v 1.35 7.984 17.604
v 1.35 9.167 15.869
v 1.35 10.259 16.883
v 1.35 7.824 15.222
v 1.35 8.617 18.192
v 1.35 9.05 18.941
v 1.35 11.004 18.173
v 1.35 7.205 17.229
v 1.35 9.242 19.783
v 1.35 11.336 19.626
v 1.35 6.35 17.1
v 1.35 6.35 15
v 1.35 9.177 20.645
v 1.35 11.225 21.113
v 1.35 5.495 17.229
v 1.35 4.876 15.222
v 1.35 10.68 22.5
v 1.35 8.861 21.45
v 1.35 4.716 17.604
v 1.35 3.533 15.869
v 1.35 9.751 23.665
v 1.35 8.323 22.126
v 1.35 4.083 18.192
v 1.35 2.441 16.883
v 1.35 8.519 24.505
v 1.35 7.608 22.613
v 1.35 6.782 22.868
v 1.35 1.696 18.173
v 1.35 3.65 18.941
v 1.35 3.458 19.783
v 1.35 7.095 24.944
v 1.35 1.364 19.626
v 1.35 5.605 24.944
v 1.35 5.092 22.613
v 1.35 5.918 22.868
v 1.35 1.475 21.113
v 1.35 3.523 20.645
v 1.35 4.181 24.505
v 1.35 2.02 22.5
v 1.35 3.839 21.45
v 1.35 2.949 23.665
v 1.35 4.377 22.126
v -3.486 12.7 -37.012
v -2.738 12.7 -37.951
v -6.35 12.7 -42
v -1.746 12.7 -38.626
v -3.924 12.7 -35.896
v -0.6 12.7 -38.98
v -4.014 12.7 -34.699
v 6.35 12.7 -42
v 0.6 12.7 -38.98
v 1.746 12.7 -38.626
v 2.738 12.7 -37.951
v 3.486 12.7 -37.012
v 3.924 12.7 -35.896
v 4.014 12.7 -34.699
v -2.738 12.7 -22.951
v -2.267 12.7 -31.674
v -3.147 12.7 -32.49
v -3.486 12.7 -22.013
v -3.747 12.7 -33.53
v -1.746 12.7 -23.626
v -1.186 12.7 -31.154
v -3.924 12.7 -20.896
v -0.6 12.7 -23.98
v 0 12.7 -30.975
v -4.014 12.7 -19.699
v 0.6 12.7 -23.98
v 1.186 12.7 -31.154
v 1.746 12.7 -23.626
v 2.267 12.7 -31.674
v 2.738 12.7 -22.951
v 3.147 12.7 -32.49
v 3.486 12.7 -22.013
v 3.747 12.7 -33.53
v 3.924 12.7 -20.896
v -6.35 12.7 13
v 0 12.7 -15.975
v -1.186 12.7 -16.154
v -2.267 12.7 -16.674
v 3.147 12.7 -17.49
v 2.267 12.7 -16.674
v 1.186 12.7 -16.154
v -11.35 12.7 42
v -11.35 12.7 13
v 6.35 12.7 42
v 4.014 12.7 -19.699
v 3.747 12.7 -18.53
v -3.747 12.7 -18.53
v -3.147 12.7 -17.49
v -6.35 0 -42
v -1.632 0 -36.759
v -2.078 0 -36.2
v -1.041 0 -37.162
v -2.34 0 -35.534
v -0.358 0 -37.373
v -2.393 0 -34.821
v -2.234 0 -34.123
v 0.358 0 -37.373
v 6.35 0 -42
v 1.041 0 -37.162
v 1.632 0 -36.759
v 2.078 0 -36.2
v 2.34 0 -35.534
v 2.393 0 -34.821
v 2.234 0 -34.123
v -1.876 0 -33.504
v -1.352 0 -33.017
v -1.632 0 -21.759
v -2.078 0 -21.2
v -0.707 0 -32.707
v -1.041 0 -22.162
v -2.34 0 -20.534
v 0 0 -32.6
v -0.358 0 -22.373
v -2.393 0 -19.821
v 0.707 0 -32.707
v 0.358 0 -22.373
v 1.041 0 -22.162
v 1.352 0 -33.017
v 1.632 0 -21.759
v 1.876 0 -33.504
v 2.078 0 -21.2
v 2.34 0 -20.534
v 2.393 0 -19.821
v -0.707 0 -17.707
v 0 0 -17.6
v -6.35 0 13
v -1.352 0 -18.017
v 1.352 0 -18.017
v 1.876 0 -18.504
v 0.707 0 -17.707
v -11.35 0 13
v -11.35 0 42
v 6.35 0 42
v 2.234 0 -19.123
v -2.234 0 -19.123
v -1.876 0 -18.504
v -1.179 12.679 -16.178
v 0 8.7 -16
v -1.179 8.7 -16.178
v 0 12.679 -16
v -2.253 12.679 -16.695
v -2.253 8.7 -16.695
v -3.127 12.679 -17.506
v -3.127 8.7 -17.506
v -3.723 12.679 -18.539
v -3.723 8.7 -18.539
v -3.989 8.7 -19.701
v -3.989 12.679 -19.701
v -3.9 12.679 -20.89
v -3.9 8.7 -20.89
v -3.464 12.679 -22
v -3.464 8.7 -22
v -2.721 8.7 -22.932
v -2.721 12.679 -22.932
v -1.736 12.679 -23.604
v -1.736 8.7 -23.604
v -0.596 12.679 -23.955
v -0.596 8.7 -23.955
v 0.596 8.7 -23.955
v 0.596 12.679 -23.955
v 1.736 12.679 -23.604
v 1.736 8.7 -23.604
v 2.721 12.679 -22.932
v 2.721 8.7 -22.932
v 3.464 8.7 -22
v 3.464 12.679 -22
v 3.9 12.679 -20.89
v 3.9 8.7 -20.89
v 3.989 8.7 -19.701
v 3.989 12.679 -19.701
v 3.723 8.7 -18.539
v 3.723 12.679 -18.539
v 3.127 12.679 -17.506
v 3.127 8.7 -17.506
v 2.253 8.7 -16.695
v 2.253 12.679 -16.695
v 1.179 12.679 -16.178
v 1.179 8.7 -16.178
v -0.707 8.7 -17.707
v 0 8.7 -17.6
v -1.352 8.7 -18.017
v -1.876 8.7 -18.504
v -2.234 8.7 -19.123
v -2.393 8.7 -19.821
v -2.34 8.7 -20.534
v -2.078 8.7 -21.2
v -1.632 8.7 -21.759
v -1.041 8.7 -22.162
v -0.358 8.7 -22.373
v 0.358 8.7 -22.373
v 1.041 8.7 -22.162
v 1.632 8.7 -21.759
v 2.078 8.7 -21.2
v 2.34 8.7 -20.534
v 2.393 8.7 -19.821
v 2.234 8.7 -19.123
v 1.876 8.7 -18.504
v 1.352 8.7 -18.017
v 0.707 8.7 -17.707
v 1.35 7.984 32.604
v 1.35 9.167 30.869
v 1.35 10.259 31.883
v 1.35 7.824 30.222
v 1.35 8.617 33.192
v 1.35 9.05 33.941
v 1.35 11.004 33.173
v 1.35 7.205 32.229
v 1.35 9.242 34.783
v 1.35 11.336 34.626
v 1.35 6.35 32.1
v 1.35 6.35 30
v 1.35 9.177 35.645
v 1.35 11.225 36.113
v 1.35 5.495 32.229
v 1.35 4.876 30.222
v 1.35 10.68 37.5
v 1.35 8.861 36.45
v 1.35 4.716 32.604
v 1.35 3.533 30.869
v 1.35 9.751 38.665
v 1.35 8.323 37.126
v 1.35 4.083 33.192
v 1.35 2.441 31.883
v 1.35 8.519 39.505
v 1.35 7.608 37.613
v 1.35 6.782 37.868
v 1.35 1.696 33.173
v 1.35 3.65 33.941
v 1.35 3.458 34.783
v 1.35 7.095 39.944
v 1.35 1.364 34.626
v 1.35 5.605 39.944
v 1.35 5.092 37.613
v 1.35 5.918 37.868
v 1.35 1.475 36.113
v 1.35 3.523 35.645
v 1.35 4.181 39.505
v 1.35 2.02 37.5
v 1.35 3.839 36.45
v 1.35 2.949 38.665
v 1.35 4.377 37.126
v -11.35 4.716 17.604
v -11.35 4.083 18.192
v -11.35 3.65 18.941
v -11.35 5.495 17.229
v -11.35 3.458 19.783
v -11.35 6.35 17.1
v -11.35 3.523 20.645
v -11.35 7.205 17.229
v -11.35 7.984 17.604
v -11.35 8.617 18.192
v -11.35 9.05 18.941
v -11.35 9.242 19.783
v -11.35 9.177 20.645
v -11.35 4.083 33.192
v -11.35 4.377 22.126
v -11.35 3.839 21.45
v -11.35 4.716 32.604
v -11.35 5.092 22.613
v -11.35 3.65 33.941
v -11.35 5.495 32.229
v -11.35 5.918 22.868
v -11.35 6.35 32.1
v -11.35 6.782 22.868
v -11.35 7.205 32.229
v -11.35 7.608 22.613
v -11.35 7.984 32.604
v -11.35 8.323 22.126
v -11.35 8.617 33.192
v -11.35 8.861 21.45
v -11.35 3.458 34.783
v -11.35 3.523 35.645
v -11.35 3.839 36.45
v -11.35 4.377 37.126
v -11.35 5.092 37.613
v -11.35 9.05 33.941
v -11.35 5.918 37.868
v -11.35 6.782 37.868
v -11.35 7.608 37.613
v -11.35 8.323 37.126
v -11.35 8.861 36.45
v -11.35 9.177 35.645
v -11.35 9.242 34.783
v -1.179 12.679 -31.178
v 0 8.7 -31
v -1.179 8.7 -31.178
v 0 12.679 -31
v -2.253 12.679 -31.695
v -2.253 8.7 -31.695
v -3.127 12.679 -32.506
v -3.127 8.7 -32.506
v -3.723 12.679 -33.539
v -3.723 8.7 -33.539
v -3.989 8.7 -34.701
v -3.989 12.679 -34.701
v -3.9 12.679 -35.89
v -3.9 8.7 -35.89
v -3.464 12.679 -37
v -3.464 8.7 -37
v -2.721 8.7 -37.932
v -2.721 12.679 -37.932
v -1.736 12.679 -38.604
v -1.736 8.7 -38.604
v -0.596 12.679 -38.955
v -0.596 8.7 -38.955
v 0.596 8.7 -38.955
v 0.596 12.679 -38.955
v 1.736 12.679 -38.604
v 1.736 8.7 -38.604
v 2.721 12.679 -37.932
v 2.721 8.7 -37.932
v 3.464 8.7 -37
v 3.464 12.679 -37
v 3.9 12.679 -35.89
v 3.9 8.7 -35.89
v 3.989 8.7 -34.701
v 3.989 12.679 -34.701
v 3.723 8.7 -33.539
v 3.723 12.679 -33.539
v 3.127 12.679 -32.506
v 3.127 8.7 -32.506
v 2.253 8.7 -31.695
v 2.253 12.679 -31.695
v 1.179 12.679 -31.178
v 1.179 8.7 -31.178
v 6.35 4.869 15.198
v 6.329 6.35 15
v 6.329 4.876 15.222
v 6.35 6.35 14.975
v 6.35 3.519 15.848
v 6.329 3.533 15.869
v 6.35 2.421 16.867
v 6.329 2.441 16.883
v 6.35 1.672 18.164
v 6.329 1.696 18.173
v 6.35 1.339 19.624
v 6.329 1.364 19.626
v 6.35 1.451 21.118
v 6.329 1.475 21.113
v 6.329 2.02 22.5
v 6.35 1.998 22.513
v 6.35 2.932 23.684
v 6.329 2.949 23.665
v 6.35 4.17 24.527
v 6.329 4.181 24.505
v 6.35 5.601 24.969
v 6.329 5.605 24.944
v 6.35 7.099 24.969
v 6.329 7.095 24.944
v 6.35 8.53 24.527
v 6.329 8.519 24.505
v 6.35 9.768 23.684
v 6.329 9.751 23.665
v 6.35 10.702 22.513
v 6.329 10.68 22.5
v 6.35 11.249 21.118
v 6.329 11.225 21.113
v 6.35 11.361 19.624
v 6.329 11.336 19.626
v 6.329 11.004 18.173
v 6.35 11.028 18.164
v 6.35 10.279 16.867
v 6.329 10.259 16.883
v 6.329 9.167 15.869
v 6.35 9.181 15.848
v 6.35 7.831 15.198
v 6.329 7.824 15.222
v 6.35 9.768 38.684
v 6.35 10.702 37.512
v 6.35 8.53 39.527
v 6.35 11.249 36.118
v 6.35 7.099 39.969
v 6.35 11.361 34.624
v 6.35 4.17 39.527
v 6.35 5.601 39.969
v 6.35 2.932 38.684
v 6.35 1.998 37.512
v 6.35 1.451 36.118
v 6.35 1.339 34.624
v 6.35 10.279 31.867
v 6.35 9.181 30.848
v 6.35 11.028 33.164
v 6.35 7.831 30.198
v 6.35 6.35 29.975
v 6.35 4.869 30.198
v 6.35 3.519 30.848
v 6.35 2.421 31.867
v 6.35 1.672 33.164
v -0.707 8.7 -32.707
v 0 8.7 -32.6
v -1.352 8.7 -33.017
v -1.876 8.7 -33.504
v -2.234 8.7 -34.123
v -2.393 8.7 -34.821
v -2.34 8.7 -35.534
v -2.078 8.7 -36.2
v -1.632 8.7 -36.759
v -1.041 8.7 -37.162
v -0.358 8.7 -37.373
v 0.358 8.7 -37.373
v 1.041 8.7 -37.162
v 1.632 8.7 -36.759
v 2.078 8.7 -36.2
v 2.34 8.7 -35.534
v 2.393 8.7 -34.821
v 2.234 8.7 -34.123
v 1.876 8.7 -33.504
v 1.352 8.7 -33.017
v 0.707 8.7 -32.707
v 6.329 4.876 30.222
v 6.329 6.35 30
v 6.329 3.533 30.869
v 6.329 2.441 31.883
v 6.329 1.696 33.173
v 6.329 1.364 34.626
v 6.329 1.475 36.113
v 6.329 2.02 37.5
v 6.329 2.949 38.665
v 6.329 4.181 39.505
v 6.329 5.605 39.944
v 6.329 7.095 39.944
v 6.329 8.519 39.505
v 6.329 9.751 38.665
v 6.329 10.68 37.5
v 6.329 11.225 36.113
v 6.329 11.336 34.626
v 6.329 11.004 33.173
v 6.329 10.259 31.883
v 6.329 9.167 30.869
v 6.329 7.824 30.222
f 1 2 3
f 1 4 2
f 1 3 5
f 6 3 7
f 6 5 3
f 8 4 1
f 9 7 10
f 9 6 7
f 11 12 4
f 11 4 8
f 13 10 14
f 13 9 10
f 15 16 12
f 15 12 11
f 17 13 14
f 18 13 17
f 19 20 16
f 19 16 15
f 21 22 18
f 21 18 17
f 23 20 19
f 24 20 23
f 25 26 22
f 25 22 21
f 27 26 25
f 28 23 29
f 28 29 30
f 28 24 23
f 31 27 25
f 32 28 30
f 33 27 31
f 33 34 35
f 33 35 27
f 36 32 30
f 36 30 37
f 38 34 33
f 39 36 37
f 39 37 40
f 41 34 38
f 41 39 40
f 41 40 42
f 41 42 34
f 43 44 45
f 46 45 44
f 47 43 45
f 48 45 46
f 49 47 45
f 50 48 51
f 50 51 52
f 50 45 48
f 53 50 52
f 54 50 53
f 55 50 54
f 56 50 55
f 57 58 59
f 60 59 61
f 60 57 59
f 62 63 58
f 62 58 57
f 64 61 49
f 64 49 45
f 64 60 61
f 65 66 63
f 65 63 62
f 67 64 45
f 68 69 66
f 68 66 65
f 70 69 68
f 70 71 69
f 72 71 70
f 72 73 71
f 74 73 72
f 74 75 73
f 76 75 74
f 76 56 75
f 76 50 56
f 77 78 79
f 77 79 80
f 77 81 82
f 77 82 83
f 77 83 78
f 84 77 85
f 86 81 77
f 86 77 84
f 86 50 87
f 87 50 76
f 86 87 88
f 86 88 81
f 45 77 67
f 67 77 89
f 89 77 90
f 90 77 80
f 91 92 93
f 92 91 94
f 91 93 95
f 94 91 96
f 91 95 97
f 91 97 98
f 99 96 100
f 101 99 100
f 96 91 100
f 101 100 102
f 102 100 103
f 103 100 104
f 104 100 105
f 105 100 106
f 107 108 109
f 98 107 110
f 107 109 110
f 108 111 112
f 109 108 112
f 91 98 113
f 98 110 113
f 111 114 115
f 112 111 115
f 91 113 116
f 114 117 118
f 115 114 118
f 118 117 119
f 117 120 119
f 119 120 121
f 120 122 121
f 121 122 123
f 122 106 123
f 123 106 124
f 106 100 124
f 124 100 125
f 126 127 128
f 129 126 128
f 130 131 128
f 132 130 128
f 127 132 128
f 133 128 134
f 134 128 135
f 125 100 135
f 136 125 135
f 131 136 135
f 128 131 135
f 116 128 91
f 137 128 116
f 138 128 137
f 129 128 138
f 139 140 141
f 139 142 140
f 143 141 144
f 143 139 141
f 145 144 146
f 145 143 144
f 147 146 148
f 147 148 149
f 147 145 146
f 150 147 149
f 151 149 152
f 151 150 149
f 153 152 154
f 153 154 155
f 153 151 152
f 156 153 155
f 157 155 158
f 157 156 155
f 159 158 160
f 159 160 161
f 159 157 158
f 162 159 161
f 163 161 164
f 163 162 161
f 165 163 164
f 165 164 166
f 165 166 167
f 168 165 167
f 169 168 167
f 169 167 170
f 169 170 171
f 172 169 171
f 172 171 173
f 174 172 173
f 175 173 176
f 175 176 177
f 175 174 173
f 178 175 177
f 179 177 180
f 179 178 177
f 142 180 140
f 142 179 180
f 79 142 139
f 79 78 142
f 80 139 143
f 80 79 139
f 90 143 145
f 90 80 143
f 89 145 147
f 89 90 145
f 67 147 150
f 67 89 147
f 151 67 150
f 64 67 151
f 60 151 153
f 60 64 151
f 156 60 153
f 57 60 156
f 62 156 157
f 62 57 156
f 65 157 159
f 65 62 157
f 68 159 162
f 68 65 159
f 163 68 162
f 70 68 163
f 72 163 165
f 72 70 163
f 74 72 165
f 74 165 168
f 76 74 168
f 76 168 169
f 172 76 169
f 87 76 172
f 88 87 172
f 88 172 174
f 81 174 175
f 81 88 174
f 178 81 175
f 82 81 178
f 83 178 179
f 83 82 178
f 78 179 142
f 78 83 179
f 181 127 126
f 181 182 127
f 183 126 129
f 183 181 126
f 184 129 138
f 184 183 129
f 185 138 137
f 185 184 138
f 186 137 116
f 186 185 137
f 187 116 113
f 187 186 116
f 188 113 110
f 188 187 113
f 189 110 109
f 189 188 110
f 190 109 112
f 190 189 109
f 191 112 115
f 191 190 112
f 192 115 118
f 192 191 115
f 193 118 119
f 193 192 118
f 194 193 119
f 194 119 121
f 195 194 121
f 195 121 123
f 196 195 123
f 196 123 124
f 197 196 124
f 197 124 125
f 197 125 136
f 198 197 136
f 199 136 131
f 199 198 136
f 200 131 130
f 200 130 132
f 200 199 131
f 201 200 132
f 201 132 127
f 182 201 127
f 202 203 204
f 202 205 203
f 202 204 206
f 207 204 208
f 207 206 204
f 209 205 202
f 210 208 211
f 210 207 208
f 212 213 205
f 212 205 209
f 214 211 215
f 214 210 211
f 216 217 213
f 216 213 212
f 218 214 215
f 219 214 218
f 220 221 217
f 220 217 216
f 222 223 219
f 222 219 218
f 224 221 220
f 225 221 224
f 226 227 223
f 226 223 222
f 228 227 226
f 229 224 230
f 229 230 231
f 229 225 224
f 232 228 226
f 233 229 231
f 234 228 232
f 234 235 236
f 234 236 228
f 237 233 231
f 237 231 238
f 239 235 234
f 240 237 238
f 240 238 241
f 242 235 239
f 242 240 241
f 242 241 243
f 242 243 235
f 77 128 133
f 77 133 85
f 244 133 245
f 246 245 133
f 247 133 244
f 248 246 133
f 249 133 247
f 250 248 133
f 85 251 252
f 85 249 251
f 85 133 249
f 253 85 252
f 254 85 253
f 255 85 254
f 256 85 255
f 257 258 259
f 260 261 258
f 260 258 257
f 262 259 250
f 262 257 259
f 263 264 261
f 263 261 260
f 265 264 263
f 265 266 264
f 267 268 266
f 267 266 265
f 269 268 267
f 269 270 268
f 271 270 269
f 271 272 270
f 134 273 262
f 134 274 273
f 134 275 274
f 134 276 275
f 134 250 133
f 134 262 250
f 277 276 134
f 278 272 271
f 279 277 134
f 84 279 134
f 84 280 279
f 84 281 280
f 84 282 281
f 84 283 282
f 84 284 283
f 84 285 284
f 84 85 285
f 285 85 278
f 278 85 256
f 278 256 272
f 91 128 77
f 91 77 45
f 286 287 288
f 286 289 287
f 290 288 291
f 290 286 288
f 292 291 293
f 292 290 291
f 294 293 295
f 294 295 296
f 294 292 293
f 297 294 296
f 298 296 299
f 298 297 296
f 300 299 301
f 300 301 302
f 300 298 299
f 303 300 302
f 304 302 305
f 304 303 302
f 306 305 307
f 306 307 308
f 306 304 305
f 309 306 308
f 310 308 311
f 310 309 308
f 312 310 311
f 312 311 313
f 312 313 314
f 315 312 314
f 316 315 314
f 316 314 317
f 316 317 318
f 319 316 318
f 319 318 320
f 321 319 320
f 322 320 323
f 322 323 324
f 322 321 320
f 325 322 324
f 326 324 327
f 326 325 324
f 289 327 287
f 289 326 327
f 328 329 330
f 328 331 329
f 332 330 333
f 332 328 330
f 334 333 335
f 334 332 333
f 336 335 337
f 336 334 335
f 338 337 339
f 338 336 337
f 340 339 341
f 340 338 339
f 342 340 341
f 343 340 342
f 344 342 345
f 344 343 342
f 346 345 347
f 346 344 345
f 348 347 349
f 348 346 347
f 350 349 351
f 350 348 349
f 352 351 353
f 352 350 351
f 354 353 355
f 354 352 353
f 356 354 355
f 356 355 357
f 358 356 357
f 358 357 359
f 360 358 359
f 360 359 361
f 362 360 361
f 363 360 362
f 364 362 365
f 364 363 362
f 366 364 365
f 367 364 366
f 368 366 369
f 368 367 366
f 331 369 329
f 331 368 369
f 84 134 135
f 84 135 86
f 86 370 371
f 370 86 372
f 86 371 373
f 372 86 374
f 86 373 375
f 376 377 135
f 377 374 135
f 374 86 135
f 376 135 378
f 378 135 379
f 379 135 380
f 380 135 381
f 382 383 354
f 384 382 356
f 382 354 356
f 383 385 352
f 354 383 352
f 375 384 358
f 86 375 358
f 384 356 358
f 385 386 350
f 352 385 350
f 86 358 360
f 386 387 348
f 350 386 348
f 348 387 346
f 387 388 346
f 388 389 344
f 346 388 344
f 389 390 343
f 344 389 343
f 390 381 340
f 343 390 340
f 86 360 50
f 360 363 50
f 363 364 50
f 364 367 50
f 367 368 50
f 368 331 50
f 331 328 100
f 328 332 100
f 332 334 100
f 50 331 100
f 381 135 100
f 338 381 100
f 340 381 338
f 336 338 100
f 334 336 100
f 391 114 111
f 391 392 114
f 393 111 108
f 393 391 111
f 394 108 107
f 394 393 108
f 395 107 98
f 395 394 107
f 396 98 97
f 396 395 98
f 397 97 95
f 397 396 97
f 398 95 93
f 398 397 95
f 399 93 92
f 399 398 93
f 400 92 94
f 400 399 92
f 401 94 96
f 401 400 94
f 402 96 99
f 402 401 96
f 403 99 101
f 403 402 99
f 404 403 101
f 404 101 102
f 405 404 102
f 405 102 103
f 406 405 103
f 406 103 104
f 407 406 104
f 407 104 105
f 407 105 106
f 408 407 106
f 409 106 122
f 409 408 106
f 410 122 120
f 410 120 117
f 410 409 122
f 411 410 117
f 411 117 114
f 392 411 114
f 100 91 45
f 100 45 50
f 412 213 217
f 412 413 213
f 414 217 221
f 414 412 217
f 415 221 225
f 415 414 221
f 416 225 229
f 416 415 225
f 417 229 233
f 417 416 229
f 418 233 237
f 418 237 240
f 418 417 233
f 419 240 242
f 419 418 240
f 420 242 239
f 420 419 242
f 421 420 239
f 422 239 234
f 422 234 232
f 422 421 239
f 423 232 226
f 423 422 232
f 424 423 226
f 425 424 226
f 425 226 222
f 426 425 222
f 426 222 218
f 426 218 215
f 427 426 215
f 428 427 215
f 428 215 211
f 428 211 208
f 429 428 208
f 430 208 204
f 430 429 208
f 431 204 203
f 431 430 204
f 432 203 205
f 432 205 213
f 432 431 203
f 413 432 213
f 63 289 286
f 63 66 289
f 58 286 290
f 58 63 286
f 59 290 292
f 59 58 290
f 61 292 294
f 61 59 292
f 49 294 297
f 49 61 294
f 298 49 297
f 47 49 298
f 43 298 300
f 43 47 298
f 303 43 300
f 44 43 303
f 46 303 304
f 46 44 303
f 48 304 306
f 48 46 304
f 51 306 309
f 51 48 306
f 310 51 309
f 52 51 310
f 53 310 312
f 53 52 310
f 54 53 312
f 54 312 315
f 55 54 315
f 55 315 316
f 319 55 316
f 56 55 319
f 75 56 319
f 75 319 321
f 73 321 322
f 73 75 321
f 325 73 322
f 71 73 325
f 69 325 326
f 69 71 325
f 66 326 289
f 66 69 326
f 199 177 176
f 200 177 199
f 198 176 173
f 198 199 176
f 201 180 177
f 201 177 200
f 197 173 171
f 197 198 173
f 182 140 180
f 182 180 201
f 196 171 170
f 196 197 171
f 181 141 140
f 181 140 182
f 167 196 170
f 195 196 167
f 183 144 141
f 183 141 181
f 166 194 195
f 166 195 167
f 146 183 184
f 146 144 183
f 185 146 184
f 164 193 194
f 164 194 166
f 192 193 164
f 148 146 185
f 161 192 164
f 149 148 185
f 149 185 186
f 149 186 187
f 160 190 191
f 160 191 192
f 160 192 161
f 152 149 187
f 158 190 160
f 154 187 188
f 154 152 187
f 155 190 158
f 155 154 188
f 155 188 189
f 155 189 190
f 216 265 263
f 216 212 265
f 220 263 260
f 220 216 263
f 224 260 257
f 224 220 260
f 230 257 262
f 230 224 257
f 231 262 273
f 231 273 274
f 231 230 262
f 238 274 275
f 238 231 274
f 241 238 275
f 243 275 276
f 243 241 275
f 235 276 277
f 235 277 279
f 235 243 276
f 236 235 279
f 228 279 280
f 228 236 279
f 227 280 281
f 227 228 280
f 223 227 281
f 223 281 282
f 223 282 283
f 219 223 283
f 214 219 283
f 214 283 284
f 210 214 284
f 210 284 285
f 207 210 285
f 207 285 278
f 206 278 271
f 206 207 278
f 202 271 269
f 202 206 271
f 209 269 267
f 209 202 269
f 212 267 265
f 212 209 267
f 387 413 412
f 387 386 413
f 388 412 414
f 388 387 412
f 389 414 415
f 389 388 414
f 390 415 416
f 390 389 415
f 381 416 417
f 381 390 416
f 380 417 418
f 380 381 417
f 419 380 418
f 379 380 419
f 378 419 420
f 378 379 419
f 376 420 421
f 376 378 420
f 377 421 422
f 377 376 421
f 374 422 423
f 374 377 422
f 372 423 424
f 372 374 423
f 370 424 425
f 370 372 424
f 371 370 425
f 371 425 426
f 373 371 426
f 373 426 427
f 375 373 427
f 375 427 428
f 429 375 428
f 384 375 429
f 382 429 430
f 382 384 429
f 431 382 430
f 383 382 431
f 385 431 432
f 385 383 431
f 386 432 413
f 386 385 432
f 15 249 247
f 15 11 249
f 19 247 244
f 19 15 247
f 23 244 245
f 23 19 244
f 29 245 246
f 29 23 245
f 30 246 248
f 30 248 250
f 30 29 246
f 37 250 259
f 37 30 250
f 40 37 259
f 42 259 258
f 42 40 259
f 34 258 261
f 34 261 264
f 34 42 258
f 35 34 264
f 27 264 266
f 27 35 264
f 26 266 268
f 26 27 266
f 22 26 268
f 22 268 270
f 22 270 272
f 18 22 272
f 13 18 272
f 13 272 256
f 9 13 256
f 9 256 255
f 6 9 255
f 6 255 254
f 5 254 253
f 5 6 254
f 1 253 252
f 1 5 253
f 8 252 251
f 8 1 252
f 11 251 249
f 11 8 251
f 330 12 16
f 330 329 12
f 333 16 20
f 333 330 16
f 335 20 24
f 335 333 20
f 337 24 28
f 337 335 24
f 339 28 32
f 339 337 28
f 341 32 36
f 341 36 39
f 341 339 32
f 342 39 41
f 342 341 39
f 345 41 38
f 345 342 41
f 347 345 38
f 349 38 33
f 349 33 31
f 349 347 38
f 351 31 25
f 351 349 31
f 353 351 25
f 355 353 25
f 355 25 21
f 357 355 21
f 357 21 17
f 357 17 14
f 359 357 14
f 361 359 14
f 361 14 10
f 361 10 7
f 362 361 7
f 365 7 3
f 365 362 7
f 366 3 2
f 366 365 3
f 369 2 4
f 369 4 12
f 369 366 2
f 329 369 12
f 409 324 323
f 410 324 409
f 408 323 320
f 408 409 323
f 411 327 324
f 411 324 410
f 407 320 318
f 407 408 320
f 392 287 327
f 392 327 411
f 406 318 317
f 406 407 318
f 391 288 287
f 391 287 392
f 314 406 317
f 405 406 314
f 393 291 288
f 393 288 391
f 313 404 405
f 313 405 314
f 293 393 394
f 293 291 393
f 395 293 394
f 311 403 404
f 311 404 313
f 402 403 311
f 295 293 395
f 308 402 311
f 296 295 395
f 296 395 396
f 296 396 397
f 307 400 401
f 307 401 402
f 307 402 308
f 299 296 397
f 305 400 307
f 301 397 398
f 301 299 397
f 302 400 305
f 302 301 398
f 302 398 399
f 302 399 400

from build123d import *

# Parameters (mm, degrees)
SKETCH2_W                     = 12.7
SKETCH2_H                     = 84
BOSS_EXTRUDE1_DEPTH           = 12.7
CBORE_FOR_M4_SHCS1_AT_2_COUNT = 2
CBORE_FOR_M4_SHCS1_AT_2_PITCH = 15
SKETCH8_W                     = 29
SKETCH8_H                     = 12.7
BOSS_EXTRUDE3_DEPTH           = 5
CBORE_FOR_M5_SHCS2_AT_2_COUNT = 2
CBORE_FOR_M5_SHCS2_AT_2_PITCH = 15


with BuildPart() as part:
    # Sketch2 → Boss-Extrude1 (new body)
    with BuildSketch(Plane(origin=(0, 0, 0), x_dir=(1, 0, 0), z_dir=(0, 1, 0))):
        Rectangle(SKETCH2_W, SKETCH2_H)
    extrude(amount=BOSS_EXTRUDE1_DEPTH)

    # Sketch4 → CBORE for M4 SHCS1 (revolve, cut)
    with BuildSketch(Plane(origin=(0, 12.7, -35), x_dir=(0, 0, 1), z_dir=(1, 0, 0))):
        Polygon((0, 0), (0, 12.7), (2.4, 12.7), (2.4, 4), (4, 4), (4, 0.020977491), (4.025, 0), align=None)
    cbore_for_m4_shcs1 = revolve(axis=Axis((0, 19.05, -35), (0, -1, 0)), mode=Mode.SUBTRACT)

    # CBORE for M4 SHCS1 at 2: CBORE for M4 SHCS1 ×2
    with Locations(*[(0, 0, i * CBORE_FOR_M4_SHCS1_AT_2_PITCH) for i in range(1, CBORE_FOR_M4_SHCS1_AT_2_COUNT)]):
        add(cbore_for_m4_shcs1, mode=Mode.SUBTRACT)

    # Sketch8 → Boss-Extrude3 (add)
    with BuildSketch(Plane.ZY.offset(6.35)):
        with Locations((27.5, 6.35)):
            Rectangle(SKETCH8_W, SKETCH8_H)
    extrude(amount=BOSS_EXTRUDE3_DEPTH)

    # Sketch7 → CBORE for M5 SHCS2 (revolve, cut)
    with BuildSketch(Plane(origin=(6.35, 6.35, 35), x_dir=(0, 0, -1), z_dir=(0, 1, 0))):
        Polygon((0, 0), (0, 17.7), (2.9, 17.7), (2.9, 5), (5, 5), (5, 0.020977491), (5.025, 0), align=None)
    cbore_for_m5_shcs2 = revolve(axis=Axis((12.7, 6.35, 35), (-1, 0, 0)), mode=Mode.SUBTRACT)

    # CBORE for M5 SHCS2 at 2: CBORE for M5 SHCS2 ×2
    with Locations(*[(0, 0, -i * CBORE_FOR_M5_SHCS2_AT_2_PITCH) for i in range(1, CBORE_FOR_M5_SHCS2_AT_2_COUNT)]):
        add(cbore_for_m5_shcs2, mode=Mode.SUBTRACT)


solid = part.part
